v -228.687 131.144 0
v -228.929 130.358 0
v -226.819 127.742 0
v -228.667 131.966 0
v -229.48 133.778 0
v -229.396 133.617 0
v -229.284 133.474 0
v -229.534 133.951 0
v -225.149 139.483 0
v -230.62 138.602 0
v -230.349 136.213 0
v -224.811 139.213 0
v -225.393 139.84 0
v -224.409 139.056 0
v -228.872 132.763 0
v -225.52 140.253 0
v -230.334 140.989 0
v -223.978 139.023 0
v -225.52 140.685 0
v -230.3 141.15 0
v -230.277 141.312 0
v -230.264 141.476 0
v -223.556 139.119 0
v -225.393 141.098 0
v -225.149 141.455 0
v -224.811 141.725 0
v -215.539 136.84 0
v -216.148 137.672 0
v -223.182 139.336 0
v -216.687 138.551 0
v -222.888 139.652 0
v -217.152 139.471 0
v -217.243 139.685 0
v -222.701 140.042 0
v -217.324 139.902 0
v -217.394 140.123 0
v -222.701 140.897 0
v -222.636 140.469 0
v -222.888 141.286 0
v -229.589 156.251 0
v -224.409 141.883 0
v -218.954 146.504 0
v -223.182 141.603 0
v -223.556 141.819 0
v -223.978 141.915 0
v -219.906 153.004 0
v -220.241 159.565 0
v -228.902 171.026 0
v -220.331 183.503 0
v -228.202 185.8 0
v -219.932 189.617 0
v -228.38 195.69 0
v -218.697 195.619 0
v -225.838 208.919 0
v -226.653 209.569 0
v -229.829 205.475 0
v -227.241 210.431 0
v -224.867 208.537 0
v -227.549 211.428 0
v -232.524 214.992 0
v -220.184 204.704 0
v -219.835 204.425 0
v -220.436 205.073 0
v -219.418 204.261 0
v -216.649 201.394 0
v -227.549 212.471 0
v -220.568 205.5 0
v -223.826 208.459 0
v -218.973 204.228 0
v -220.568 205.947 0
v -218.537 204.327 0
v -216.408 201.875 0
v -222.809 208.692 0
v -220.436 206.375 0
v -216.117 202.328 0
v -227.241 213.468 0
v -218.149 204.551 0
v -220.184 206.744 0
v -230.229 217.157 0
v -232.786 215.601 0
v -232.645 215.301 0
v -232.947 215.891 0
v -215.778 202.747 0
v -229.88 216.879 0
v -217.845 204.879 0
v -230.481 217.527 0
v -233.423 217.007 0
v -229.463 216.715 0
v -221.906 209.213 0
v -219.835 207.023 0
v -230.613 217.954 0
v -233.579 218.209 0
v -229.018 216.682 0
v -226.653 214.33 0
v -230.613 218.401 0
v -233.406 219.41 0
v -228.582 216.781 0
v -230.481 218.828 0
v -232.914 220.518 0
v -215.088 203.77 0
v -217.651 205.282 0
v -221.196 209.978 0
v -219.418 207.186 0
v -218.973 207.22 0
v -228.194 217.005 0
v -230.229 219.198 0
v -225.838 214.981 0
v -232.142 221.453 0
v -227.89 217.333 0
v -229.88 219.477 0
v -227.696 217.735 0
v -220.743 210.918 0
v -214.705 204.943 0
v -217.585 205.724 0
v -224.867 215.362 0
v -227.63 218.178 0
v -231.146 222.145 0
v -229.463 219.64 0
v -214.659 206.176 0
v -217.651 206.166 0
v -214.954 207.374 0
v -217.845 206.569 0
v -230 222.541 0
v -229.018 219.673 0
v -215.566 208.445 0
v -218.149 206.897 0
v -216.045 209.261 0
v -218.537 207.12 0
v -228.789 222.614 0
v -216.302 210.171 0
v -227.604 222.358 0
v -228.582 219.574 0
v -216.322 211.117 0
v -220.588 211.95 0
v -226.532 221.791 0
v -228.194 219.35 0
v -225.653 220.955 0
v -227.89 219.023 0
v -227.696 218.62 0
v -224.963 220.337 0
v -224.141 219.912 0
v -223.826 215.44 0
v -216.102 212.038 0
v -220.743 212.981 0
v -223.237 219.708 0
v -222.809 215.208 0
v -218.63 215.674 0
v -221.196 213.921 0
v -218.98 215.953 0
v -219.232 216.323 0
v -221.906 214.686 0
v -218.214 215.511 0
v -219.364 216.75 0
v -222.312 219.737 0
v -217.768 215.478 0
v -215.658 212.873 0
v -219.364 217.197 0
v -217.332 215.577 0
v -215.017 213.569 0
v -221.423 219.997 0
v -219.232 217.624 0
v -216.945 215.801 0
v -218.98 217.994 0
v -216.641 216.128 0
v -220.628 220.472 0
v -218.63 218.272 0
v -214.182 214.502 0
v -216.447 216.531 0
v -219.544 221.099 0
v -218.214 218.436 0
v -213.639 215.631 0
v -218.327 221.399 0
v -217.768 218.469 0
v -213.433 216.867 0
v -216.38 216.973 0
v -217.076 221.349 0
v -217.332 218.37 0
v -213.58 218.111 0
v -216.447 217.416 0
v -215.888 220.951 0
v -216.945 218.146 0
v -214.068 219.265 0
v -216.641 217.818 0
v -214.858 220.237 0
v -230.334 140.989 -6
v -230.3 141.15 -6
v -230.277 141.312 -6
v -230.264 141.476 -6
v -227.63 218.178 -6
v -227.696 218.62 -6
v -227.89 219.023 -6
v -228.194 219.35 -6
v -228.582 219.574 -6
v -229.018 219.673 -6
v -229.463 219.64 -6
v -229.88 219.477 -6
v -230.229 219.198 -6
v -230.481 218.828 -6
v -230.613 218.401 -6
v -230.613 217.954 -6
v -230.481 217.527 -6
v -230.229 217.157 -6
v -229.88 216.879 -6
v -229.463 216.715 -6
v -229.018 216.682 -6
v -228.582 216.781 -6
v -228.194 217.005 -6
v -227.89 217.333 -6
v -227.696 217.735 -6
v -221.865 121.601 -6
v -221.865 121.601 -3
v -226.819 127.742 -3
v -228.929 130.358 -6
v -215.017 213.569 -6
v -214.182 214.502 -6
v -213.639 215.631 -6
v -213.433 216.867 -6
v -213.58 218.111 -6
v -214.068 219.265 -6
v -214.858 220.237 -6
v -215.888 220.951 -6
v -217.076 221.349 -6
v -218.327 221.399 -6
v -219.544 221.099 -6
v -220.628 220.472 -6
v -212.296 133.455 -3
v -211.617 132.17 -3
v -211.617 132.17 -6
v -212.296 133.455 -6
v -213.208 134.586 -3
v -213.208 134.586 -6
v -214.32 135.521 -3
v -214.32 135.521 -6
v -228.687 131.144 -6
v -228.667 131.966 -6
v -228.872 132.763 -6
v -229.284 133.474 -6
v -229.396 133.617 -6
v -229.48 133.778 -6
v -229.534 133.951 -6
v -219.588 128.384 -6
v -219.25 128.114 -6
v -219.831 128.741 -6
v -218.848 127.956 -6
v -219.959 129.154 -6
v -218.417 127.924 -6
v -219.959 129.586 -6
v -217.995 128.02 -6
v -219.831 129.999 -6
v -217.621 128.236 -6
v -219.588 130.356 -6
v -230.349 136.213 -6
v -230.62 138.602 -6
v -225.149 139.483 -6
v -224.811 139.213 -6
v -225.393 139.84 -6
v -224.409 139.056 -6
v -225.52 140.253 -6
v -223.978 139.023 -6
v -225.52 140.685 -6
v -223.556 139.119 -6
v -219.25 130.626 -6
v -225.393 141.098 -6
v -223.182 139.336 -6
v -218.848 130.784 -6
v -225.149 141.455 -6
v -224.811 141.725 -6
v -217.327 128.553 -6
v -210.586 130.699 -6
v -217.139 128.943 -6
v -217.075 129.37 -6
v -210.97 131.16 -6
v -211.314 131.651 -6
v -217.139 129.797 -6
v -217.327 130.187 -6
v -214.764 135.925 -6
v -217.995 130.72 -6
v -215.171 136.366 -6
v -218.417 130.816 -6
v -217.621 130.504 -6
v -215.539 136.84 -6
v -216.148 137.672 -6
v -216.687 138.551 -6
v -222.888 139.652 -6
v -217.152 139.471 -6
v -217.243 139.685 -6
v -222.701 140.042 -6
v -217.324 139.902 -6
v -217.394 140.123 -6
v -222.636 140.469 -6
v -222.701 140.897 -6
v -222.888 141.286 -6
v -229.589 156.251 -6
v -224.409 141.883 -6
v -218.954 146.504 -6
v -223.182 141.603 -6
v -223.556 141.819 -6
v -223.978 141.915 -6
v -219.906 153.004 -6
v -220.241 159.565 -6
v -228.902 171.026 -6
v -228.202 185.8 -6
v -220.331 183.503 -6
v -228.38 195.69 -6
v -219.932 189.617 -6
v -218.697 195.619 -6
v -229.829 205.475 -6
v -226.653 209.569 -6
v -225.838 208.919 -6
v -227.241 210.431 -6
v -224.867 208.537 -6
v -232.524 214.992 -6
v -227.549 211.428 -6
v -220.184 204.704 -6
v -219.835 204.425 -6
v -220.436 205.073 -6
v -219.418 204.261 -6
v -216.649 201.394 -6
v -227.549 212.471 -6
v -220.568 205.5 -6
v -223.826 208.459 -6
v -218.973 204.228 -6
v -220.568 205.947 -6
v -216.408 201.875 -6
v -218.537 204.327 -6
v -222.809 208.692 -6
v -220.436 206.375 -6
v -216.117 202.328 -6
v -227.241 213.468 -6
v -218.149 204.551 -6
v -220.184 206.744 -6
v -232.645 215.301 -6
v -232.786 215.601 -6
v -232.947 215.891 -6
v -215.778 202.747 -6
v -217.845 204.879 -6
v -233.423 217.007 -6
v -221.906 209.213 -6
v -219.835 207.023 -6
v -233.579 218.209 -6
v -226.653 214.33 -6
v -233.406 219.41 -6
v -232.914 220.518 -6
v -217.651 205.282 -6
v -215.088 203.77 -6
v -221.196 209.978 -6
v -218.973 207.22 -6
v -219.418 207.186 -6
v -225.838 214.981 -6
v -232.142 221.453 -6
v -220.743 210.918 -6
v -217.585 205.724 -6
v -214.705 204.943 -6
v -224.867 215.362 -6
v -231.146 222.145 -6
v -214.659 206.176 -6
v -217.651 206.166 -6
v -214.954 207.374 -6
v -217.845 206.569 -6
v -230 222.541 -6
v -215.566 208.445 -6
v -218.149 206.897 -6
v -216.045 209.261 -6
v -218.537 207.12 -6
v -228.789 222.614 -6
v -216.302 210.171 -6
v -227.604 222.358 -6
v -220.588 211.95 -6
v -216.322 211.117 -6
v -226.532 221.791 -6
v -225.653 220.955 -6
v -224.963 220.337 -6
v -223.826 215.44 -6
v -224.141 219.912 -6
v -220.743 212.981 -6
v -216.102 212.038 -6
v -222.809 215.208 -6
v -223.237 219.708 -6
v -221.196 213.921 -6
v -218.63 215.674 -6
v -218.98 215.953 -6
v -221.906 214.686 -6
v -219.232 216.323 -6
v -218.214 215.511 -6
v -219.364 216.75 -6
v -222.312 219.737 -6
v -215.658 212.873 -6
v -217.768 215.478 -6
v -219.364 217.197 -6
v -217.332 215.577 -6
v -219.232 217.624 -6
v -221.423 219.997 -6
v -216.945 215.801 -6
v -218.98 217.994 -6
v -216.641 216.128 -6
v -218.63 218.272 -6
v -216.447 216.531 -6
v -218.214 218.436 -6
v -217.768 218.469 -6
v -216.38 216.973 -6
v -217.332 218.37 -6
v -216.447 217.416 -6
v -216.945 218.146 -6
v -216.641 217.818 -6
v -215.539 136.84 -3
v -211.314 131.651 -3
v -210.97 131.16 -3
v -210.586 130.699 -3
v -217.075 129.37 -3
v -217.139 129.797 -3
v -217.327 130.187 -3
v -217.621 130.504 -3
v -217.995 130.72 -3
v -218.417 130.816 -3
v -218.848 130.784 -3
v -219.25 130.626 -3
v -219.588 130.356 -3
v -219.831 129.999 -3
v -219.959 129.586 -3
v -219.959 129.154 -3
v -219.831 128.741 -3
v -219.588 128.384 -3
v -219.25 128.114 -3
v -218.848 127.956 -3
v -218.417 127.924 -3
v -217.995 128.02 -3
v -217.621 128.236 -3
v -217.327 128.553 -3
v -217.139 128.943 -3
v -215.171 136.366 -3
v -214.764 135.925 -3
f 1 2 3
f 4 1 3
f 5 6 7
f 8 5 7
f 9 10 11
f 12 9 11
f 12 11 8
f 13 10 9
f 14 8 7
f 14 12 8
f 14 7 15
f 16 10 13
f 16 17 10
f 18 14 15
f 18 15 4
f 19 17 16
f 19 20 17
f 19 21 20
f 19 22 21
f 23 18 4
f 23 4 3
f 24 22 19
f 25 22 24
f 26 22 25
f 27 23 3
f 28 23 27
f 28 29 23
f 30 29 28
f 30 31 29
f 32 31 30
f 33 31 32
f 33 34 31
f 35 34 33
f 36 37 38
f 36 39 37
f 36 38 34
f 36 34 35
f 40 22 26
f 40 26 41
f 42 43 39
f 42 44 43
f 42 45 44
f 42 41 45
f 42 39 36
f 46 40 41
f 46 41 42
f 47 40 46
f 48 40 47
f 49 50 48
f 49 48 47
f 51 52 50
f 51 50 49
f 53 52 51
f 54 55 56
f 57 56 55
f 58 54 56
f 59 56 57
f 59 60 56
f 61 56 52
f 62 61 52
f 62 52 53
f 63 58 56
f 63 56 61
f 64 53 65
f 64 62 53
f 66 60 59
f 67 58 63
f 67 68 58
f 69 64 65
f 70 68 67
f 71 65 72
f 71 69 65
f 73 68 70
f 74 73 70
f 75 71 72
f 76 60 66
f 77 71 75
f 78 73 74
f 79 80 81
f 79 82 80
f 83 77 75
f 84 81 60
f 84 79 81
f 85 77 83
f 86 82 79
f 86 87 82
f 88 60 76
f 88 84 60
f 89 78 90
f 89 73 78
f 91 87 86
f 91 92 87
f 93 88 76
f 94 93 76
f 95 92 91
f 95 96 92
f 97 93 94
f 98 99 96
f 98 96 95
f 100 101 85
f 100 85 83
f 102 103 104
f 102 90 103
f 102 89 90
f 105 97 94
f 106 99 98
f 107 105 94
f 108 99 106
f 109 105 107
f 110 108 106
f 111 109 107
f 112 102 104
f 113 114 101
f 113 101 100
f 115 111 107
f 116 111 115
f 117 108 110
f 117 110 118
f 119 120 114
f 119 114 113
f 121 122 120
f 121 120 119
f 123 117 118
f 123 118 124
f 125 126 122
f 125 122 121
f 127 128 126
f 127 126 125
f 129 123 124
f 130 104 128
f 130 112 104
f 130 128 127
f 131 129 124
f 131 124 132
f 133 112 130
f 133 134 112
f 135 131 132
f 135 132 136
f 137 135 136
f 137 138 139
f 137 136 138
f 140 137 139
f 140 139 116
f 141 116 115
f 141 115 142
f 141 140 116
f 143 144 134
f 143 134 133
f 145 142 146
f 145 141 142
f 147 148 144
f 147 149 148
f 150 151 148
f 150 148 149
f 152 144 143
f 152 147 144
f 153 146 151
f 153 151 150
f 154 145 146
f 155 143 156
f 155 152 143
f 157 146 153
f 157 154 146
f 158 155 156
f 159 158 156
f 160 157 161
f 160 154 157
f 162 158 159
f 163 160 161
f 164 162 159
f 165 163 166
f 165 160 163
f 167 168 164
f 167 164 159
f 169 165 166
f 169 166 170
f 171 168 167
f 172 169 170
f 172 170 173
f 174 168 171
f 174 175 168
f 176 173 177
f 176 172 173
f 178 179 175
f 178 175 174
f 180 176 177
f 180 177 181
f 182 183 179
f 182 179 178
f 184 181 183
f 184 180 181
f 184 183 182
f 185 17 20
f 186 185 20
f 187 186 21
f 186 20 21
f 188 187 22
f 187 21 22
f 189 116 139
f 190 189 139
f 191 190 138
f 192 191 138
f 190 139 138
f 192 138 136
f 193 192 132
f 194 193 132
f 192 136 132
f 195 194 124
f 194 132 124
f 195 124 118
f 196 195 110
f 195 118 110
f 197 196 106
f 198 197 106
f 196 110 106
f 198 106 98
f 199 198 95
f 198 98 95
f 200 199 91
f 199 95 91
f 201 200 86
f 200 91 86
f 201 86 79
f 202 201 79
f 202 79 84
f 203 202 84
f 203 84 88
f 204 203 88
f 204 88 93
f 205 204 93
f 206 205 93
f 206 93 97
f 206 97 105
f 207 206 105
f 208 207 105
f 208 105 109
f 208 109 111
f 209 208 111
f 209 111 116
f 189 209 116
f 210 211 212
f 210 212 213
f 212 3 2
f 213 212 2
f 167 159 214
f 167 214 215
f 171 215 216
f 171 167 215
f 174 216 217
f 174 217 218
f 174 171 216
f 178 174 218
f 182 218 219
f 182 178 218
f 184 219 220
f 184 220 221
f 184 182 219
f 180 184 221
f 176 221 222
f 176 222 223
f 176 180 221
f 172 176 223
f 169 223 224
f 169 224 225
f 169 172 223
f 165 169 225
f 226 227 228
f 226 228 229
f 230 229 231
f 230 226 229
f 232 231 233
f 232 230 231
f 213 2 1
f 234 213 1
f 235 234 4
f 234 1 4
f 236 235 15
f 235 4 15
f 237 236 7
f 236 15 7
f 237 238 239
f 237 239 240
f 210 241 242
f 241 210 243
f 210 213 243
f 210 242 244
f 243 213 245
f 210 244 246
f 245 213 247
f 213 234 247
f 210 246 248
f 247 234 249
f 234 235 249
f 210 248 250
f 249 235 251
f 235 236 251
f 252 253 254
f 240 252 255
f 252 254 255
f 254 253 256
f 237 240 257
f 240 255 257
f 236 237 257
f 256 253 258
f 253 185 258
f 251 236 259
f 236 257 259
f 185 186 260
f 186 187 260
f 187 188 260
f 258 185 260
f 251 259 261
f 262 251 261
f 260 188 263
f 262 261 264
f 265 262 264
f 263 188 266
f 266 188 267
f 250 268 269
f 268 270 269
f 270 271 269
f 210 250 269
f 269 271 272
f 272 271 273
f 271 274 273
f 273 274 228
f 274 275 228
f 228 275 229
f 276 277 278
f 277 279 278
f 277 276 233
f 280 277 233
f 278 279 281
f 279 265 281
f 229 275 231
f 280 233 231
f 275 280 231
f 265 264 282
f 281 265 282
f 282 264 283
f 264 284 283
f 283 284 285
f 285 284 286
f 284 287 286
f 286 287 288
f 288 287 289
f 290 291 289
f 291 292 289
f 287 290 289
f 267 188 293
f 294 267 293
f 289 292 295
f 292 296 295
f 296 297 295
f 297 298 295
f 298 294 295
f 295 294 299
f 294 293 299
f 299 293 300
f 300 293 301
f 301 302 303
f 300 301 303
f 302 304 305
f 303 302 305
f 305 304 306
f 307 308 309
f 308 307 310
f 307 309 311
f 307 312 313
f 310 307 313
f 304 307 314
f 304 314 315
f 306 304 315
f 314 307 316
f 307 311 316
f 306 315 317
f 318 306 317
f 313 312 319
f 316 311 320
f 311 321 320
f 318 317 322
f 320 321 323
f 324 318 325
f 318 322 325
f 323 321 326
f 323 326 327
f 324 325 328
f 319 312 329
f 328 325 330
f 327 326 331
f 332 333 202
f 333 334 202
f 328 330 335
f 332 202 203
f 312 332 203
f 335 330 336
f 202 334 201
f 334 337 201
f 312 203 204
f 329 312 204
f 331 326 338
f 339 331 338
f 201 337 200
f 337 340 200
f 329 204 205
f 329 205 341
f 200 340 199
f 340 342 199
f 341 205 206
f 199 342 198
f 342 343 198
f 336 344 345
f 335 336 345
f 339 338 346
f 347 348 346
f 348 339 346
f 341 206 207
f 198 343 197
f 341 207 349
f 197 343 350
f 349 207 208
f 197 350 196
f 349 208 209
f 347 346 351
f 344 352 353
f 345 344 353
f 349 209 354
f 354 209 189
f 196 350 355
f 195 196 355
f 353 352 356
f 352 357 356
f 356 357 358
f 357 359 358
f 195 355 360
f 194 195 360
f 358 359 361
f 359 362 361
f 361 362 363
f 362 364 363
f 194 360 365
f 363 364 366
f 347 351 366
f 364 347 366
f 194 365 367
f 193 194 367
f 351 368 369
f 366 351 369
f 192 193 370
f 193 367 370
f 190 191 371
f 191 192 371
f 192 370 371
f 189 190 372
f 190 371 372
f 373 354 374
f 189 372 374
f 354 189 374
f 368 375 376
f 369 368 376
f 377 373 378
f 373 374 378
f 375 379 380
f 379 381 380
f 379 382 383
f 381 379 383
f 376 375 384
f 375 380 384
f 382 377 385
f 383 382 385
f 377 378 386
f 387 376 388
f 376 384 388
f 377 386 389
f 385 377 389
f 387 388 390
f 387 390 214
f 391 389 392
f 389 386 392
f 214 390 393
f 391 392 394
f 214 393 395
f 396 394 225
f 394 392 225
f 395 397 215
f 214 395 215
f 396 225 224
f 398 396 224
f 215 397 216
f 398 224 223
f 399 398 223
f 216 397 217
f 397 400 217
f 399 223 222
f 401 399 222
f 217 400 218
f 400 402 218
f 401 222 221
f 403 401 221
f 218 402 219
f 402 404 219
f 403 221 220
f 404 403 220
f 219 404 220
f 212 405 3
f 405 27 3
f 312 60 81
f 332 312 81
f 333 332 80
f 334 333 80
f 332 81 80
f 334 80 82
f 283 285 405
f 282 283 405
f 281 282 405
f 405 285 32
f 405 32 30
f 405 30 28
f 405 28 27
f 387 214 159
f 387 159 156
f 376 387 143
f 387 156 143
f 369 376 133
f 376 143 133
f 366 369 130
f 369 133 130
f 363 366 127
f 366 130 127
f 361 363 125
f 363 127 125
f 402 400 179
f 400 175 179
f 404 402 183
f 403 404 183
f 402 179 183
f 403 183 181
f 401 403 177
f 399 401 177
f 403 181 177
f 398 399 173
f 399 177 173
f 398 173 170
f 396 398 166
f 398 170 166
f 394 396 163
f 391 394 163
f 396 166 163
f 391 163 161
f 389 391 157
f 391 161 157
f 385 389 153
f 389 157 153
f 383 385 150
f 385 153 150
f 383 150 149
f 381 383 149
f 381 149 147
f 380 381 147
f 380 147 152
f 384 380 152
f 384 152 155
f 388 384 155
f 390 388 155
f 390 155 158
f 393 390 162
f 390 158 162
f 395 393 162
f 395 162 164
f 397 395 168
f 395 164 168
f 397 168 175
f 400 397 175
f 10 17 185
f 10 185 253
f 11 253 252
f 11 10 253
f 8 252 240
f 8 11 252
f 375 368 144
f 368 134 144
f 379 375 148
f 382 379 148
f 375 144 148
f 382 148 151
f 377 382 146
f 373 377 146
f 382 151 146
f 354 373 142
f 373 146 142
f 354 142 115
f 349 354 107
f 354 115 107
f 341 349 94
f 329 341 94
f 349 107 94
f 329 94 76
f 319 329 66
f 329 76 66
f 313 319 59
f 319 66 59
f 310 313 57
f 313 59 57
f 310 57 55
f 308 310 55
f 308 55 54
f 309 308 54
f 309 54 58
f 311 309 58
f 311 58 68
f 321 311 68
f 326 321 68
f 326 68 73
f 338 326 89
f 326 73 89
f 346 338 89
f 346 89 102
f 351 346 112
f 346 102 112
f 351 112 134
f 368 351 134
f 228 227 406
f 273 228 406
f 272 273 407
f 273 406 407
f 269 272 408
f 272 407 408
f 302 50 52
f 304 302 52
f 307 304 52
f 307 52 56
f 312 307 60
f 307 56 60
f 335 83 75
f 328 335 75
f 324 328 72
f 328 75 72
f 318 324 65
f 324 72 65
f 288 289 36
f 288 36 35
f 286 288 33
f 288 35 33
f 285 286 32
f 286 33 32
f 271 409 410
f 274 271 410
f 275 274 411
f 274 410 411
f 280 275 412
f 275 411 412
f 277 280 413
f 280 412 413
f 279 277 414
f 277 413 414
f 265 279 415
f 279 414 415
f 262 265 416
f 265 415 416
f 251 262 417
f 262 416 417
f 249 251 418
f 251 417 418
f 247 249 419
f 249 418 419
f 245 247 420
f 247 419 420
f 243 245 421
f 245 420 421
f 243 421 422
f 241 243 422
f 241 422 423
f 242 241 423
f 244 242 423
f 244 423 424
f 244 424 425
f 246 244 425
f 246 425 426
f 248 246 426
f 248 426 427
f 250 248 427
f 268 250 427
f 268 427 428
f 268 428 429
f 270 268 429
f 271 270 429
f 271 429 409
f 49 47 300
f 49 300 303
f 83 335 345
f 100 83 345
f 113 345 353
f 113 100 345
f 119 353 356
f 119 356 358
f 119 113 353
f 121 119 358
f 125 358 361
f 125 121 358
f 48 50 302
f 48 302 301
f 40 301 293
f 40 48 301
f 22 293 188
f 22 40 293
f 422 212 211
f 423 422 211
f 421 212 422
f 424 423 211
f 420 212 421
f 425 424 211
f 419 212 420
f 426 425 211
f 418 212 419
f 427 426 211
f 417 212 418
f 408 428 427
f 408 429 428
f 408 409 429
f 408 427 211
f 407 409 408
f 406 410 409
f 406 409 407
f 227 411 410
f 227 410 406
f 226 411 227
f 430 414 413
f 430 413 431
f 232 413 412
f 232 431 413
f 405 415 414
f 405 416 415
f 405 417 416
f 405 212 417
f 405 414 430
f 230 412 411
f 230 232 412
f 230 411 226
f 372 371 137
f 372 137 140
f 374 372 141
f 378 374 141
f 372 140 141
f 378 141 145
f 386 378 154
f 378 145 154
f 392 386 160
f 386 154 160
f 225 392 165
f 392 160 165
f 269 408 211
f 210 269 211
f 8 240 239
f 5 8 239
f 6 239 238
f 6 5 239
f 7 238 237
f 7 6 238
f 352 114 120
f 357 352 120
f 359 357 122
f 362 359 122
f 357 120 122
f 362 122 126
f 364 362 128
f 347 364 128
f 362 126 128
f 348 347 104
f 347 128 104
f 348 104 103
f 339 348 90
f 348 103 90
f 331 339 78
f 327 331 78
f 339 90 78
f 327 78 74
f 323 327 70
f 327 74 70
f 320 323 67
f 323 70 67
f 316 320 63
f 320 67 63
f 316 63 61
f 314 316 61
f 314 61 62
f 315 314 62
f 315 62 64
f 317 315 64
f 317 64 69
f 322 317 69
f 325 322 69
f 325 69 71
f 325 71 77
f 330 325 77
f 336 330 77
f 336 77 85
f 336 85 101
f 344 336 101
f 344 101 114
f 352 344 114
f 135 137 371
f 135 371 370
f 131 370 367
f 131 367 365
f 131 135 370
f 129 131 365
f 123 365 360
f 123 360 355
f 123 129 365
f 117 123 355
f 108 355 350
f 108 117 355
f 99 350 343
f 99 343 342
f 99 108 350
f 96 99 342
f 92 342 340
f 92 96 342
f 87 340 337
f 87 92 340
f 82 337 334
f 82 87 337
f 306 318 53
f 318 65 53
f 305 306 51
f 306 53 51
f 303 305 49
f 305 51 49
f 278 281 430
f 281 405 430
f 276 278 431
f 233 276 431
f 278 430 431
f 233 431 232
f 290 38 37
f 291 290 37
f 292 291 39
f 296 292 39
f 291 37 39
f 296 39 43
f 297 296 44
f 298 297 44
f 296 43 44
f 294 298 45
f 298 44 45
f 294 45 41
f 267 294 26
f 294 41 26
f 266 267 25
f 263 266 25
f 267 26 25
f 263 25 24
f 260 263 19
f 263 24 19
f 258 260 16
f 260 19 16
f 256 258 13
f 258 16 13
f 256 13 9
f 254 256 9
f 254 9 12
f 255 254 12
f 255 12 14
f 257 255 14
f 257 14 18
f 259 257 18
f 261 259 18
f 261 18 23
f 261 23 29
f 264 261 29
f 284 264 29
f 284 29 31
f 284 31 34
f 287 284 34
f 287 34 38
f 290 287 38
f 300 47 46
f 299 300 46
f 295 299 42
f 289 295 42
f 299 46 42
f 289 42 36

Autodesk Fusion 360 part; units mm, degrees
sketch "T_v1_Arm_5_Inch_Shorty_6mm_or_5mm_4x" plane through (0, 0, 0) normal (0, 0, 1) x (1, 0, 0)
  arc A0 (-225.6533, 220.9552) -> (-220.6279, 220.4722) centre (-222.8873, 223.3495) ccw
  arc A1 (-230.3335, 140.9887) -> (-229.5344, 133.9506) centre (-220.257, 138.5683) ccw
  arc A2 (-217.3945, 140.1231) -> (-217.1516, 139.4711) centre (-212.5989, 141.5382) ccw
  line L0 (-215.5389, 136.8403) -> (-226.8186, 127.742)
  arc A3 (-215.5389, 136.8403) -> (-214.3199, 135.521) centre (-209.8871, 140.8396) ccw
  arc A4 (-215.7785, 202.7474) -> (-216.6488, 201.3936) centre (-212.0626, 199.402) ccw
  arc A5 (-215.0172, 213.5689) -> (-220.6279, 220.4722) centre (-217.8805, 216.9734) ccw
  arc A6 (-220.2406, 159.5651) -> (-217.3945, 140.1231) centre (-150.6263, 159.8267) ccw
  arc A7 (-215.7785, 202.7474) -> (-215.5657, 208.4451) centre (-219.0846, 205.7238) ccw
  circle A8 centre (-217.8805, 216.9734) radius 1.5
  arc A9 (-228.9289, 130.3582) -> (-229.2844, 133.4743) centre (-231.6499, 131.6261) ccw
  circle A10 centre (-224.0861, 140.4692) radius 1.45
  circle A11 centre (-218.5249, 129.3701) radius 1.45
  arc A12 (-216.6488, 201.3936) -> (-220.3306, 183.5032) centre (-175.8354, 183.6704) ccw
  arc A13 (-225.6533, 220.9552) -> (-232.9473, 215.8914) centre (-229.1297, 218.1776) ccw
  arc A14 (-229.5344, 133.9506) -> (-229.2844, 133.4743) centre (-228.5434, 134.167) ccw
  circle A15 centre (-219.0847, 205.7238) radius 1.5
  arc A16 (-211.6169, 132.1699) -> (-210.5855, 130.6992) centre (-205.2604, 135.5308) ccw
  arc A17 (-217.1516, 139.4711) -> (-215.5389, 136.8403) centre (-205.7671, 144.6403) ccw
  line L1 (-221.8653, 121.601) -> (-228.9289, 130.3582)
  circle A18 centre (-224.0878, 211.9497) radius 3.5
  circle A19 centre (-218.5249, 129.3701) radius 1.45
  arc A20 (-228.2024, 185.7996) -> (-232.5238, 214.992) centre (-304.8727, 189.366) ccw
  line L2 (-220.2406, 159.5651) -> (-220.3306, 183.5032)
  circle A21 centre (-229.1297, 218.1776) radius 1.5
  arc A22 (-232.5238, 214.992) -> (-232.9473, 215.8914) centre (-237.2369, 213.3226) ccw
  arc A23 (-211.6169, 132.1699) -> (-214.3199, 135.521) centre (-218.6052, 129.2988) ccw
  line L3 (-210.5855, 130.6992) -> (-221.8653, 121.601)
  arc A24 (-215.0172, 213.5689) -> (-215.5657, 208.4451) centre (-212.6223, 210.7213) ccw
  arc A25 (-228.2024, 185.7996) -> (-230.2645, 141.4764) centre (17543.3039, -663.1993) ccw
  arc A26 (-230.3335, 140.9887) -> (-230.2645, 141.4764) centre (-232.8519, 141.5936) ccw
extrude "Extrude1" add sketch "T_v1_Arm_5_Inch_Shorty_6mm_or_5mm_4x" against normal blind 5.5 makes body 1
extrude "Extrude2" cut sketch "T_v1_Arm_5_Inch_Shorty_6mm_or_5mm_4x" against normal blind 2.75 contours L0 A3 A16 L1 A23 L3 bodies 1
extrude "Extrude3" add sketch "T_v1_Arm_5_Inch_Shorty_6mm_or_5mm_4x" against normal blind 6 separate body makes body 2
extrude "Extrude4" cut sketch "T_v1_Arm_5_Inch_Shorty_6mm_or_5mm_4x" against normal blind 3 contours L0 A3 A16 L1 A23 L3 bodies 2
hidden bodies 1
